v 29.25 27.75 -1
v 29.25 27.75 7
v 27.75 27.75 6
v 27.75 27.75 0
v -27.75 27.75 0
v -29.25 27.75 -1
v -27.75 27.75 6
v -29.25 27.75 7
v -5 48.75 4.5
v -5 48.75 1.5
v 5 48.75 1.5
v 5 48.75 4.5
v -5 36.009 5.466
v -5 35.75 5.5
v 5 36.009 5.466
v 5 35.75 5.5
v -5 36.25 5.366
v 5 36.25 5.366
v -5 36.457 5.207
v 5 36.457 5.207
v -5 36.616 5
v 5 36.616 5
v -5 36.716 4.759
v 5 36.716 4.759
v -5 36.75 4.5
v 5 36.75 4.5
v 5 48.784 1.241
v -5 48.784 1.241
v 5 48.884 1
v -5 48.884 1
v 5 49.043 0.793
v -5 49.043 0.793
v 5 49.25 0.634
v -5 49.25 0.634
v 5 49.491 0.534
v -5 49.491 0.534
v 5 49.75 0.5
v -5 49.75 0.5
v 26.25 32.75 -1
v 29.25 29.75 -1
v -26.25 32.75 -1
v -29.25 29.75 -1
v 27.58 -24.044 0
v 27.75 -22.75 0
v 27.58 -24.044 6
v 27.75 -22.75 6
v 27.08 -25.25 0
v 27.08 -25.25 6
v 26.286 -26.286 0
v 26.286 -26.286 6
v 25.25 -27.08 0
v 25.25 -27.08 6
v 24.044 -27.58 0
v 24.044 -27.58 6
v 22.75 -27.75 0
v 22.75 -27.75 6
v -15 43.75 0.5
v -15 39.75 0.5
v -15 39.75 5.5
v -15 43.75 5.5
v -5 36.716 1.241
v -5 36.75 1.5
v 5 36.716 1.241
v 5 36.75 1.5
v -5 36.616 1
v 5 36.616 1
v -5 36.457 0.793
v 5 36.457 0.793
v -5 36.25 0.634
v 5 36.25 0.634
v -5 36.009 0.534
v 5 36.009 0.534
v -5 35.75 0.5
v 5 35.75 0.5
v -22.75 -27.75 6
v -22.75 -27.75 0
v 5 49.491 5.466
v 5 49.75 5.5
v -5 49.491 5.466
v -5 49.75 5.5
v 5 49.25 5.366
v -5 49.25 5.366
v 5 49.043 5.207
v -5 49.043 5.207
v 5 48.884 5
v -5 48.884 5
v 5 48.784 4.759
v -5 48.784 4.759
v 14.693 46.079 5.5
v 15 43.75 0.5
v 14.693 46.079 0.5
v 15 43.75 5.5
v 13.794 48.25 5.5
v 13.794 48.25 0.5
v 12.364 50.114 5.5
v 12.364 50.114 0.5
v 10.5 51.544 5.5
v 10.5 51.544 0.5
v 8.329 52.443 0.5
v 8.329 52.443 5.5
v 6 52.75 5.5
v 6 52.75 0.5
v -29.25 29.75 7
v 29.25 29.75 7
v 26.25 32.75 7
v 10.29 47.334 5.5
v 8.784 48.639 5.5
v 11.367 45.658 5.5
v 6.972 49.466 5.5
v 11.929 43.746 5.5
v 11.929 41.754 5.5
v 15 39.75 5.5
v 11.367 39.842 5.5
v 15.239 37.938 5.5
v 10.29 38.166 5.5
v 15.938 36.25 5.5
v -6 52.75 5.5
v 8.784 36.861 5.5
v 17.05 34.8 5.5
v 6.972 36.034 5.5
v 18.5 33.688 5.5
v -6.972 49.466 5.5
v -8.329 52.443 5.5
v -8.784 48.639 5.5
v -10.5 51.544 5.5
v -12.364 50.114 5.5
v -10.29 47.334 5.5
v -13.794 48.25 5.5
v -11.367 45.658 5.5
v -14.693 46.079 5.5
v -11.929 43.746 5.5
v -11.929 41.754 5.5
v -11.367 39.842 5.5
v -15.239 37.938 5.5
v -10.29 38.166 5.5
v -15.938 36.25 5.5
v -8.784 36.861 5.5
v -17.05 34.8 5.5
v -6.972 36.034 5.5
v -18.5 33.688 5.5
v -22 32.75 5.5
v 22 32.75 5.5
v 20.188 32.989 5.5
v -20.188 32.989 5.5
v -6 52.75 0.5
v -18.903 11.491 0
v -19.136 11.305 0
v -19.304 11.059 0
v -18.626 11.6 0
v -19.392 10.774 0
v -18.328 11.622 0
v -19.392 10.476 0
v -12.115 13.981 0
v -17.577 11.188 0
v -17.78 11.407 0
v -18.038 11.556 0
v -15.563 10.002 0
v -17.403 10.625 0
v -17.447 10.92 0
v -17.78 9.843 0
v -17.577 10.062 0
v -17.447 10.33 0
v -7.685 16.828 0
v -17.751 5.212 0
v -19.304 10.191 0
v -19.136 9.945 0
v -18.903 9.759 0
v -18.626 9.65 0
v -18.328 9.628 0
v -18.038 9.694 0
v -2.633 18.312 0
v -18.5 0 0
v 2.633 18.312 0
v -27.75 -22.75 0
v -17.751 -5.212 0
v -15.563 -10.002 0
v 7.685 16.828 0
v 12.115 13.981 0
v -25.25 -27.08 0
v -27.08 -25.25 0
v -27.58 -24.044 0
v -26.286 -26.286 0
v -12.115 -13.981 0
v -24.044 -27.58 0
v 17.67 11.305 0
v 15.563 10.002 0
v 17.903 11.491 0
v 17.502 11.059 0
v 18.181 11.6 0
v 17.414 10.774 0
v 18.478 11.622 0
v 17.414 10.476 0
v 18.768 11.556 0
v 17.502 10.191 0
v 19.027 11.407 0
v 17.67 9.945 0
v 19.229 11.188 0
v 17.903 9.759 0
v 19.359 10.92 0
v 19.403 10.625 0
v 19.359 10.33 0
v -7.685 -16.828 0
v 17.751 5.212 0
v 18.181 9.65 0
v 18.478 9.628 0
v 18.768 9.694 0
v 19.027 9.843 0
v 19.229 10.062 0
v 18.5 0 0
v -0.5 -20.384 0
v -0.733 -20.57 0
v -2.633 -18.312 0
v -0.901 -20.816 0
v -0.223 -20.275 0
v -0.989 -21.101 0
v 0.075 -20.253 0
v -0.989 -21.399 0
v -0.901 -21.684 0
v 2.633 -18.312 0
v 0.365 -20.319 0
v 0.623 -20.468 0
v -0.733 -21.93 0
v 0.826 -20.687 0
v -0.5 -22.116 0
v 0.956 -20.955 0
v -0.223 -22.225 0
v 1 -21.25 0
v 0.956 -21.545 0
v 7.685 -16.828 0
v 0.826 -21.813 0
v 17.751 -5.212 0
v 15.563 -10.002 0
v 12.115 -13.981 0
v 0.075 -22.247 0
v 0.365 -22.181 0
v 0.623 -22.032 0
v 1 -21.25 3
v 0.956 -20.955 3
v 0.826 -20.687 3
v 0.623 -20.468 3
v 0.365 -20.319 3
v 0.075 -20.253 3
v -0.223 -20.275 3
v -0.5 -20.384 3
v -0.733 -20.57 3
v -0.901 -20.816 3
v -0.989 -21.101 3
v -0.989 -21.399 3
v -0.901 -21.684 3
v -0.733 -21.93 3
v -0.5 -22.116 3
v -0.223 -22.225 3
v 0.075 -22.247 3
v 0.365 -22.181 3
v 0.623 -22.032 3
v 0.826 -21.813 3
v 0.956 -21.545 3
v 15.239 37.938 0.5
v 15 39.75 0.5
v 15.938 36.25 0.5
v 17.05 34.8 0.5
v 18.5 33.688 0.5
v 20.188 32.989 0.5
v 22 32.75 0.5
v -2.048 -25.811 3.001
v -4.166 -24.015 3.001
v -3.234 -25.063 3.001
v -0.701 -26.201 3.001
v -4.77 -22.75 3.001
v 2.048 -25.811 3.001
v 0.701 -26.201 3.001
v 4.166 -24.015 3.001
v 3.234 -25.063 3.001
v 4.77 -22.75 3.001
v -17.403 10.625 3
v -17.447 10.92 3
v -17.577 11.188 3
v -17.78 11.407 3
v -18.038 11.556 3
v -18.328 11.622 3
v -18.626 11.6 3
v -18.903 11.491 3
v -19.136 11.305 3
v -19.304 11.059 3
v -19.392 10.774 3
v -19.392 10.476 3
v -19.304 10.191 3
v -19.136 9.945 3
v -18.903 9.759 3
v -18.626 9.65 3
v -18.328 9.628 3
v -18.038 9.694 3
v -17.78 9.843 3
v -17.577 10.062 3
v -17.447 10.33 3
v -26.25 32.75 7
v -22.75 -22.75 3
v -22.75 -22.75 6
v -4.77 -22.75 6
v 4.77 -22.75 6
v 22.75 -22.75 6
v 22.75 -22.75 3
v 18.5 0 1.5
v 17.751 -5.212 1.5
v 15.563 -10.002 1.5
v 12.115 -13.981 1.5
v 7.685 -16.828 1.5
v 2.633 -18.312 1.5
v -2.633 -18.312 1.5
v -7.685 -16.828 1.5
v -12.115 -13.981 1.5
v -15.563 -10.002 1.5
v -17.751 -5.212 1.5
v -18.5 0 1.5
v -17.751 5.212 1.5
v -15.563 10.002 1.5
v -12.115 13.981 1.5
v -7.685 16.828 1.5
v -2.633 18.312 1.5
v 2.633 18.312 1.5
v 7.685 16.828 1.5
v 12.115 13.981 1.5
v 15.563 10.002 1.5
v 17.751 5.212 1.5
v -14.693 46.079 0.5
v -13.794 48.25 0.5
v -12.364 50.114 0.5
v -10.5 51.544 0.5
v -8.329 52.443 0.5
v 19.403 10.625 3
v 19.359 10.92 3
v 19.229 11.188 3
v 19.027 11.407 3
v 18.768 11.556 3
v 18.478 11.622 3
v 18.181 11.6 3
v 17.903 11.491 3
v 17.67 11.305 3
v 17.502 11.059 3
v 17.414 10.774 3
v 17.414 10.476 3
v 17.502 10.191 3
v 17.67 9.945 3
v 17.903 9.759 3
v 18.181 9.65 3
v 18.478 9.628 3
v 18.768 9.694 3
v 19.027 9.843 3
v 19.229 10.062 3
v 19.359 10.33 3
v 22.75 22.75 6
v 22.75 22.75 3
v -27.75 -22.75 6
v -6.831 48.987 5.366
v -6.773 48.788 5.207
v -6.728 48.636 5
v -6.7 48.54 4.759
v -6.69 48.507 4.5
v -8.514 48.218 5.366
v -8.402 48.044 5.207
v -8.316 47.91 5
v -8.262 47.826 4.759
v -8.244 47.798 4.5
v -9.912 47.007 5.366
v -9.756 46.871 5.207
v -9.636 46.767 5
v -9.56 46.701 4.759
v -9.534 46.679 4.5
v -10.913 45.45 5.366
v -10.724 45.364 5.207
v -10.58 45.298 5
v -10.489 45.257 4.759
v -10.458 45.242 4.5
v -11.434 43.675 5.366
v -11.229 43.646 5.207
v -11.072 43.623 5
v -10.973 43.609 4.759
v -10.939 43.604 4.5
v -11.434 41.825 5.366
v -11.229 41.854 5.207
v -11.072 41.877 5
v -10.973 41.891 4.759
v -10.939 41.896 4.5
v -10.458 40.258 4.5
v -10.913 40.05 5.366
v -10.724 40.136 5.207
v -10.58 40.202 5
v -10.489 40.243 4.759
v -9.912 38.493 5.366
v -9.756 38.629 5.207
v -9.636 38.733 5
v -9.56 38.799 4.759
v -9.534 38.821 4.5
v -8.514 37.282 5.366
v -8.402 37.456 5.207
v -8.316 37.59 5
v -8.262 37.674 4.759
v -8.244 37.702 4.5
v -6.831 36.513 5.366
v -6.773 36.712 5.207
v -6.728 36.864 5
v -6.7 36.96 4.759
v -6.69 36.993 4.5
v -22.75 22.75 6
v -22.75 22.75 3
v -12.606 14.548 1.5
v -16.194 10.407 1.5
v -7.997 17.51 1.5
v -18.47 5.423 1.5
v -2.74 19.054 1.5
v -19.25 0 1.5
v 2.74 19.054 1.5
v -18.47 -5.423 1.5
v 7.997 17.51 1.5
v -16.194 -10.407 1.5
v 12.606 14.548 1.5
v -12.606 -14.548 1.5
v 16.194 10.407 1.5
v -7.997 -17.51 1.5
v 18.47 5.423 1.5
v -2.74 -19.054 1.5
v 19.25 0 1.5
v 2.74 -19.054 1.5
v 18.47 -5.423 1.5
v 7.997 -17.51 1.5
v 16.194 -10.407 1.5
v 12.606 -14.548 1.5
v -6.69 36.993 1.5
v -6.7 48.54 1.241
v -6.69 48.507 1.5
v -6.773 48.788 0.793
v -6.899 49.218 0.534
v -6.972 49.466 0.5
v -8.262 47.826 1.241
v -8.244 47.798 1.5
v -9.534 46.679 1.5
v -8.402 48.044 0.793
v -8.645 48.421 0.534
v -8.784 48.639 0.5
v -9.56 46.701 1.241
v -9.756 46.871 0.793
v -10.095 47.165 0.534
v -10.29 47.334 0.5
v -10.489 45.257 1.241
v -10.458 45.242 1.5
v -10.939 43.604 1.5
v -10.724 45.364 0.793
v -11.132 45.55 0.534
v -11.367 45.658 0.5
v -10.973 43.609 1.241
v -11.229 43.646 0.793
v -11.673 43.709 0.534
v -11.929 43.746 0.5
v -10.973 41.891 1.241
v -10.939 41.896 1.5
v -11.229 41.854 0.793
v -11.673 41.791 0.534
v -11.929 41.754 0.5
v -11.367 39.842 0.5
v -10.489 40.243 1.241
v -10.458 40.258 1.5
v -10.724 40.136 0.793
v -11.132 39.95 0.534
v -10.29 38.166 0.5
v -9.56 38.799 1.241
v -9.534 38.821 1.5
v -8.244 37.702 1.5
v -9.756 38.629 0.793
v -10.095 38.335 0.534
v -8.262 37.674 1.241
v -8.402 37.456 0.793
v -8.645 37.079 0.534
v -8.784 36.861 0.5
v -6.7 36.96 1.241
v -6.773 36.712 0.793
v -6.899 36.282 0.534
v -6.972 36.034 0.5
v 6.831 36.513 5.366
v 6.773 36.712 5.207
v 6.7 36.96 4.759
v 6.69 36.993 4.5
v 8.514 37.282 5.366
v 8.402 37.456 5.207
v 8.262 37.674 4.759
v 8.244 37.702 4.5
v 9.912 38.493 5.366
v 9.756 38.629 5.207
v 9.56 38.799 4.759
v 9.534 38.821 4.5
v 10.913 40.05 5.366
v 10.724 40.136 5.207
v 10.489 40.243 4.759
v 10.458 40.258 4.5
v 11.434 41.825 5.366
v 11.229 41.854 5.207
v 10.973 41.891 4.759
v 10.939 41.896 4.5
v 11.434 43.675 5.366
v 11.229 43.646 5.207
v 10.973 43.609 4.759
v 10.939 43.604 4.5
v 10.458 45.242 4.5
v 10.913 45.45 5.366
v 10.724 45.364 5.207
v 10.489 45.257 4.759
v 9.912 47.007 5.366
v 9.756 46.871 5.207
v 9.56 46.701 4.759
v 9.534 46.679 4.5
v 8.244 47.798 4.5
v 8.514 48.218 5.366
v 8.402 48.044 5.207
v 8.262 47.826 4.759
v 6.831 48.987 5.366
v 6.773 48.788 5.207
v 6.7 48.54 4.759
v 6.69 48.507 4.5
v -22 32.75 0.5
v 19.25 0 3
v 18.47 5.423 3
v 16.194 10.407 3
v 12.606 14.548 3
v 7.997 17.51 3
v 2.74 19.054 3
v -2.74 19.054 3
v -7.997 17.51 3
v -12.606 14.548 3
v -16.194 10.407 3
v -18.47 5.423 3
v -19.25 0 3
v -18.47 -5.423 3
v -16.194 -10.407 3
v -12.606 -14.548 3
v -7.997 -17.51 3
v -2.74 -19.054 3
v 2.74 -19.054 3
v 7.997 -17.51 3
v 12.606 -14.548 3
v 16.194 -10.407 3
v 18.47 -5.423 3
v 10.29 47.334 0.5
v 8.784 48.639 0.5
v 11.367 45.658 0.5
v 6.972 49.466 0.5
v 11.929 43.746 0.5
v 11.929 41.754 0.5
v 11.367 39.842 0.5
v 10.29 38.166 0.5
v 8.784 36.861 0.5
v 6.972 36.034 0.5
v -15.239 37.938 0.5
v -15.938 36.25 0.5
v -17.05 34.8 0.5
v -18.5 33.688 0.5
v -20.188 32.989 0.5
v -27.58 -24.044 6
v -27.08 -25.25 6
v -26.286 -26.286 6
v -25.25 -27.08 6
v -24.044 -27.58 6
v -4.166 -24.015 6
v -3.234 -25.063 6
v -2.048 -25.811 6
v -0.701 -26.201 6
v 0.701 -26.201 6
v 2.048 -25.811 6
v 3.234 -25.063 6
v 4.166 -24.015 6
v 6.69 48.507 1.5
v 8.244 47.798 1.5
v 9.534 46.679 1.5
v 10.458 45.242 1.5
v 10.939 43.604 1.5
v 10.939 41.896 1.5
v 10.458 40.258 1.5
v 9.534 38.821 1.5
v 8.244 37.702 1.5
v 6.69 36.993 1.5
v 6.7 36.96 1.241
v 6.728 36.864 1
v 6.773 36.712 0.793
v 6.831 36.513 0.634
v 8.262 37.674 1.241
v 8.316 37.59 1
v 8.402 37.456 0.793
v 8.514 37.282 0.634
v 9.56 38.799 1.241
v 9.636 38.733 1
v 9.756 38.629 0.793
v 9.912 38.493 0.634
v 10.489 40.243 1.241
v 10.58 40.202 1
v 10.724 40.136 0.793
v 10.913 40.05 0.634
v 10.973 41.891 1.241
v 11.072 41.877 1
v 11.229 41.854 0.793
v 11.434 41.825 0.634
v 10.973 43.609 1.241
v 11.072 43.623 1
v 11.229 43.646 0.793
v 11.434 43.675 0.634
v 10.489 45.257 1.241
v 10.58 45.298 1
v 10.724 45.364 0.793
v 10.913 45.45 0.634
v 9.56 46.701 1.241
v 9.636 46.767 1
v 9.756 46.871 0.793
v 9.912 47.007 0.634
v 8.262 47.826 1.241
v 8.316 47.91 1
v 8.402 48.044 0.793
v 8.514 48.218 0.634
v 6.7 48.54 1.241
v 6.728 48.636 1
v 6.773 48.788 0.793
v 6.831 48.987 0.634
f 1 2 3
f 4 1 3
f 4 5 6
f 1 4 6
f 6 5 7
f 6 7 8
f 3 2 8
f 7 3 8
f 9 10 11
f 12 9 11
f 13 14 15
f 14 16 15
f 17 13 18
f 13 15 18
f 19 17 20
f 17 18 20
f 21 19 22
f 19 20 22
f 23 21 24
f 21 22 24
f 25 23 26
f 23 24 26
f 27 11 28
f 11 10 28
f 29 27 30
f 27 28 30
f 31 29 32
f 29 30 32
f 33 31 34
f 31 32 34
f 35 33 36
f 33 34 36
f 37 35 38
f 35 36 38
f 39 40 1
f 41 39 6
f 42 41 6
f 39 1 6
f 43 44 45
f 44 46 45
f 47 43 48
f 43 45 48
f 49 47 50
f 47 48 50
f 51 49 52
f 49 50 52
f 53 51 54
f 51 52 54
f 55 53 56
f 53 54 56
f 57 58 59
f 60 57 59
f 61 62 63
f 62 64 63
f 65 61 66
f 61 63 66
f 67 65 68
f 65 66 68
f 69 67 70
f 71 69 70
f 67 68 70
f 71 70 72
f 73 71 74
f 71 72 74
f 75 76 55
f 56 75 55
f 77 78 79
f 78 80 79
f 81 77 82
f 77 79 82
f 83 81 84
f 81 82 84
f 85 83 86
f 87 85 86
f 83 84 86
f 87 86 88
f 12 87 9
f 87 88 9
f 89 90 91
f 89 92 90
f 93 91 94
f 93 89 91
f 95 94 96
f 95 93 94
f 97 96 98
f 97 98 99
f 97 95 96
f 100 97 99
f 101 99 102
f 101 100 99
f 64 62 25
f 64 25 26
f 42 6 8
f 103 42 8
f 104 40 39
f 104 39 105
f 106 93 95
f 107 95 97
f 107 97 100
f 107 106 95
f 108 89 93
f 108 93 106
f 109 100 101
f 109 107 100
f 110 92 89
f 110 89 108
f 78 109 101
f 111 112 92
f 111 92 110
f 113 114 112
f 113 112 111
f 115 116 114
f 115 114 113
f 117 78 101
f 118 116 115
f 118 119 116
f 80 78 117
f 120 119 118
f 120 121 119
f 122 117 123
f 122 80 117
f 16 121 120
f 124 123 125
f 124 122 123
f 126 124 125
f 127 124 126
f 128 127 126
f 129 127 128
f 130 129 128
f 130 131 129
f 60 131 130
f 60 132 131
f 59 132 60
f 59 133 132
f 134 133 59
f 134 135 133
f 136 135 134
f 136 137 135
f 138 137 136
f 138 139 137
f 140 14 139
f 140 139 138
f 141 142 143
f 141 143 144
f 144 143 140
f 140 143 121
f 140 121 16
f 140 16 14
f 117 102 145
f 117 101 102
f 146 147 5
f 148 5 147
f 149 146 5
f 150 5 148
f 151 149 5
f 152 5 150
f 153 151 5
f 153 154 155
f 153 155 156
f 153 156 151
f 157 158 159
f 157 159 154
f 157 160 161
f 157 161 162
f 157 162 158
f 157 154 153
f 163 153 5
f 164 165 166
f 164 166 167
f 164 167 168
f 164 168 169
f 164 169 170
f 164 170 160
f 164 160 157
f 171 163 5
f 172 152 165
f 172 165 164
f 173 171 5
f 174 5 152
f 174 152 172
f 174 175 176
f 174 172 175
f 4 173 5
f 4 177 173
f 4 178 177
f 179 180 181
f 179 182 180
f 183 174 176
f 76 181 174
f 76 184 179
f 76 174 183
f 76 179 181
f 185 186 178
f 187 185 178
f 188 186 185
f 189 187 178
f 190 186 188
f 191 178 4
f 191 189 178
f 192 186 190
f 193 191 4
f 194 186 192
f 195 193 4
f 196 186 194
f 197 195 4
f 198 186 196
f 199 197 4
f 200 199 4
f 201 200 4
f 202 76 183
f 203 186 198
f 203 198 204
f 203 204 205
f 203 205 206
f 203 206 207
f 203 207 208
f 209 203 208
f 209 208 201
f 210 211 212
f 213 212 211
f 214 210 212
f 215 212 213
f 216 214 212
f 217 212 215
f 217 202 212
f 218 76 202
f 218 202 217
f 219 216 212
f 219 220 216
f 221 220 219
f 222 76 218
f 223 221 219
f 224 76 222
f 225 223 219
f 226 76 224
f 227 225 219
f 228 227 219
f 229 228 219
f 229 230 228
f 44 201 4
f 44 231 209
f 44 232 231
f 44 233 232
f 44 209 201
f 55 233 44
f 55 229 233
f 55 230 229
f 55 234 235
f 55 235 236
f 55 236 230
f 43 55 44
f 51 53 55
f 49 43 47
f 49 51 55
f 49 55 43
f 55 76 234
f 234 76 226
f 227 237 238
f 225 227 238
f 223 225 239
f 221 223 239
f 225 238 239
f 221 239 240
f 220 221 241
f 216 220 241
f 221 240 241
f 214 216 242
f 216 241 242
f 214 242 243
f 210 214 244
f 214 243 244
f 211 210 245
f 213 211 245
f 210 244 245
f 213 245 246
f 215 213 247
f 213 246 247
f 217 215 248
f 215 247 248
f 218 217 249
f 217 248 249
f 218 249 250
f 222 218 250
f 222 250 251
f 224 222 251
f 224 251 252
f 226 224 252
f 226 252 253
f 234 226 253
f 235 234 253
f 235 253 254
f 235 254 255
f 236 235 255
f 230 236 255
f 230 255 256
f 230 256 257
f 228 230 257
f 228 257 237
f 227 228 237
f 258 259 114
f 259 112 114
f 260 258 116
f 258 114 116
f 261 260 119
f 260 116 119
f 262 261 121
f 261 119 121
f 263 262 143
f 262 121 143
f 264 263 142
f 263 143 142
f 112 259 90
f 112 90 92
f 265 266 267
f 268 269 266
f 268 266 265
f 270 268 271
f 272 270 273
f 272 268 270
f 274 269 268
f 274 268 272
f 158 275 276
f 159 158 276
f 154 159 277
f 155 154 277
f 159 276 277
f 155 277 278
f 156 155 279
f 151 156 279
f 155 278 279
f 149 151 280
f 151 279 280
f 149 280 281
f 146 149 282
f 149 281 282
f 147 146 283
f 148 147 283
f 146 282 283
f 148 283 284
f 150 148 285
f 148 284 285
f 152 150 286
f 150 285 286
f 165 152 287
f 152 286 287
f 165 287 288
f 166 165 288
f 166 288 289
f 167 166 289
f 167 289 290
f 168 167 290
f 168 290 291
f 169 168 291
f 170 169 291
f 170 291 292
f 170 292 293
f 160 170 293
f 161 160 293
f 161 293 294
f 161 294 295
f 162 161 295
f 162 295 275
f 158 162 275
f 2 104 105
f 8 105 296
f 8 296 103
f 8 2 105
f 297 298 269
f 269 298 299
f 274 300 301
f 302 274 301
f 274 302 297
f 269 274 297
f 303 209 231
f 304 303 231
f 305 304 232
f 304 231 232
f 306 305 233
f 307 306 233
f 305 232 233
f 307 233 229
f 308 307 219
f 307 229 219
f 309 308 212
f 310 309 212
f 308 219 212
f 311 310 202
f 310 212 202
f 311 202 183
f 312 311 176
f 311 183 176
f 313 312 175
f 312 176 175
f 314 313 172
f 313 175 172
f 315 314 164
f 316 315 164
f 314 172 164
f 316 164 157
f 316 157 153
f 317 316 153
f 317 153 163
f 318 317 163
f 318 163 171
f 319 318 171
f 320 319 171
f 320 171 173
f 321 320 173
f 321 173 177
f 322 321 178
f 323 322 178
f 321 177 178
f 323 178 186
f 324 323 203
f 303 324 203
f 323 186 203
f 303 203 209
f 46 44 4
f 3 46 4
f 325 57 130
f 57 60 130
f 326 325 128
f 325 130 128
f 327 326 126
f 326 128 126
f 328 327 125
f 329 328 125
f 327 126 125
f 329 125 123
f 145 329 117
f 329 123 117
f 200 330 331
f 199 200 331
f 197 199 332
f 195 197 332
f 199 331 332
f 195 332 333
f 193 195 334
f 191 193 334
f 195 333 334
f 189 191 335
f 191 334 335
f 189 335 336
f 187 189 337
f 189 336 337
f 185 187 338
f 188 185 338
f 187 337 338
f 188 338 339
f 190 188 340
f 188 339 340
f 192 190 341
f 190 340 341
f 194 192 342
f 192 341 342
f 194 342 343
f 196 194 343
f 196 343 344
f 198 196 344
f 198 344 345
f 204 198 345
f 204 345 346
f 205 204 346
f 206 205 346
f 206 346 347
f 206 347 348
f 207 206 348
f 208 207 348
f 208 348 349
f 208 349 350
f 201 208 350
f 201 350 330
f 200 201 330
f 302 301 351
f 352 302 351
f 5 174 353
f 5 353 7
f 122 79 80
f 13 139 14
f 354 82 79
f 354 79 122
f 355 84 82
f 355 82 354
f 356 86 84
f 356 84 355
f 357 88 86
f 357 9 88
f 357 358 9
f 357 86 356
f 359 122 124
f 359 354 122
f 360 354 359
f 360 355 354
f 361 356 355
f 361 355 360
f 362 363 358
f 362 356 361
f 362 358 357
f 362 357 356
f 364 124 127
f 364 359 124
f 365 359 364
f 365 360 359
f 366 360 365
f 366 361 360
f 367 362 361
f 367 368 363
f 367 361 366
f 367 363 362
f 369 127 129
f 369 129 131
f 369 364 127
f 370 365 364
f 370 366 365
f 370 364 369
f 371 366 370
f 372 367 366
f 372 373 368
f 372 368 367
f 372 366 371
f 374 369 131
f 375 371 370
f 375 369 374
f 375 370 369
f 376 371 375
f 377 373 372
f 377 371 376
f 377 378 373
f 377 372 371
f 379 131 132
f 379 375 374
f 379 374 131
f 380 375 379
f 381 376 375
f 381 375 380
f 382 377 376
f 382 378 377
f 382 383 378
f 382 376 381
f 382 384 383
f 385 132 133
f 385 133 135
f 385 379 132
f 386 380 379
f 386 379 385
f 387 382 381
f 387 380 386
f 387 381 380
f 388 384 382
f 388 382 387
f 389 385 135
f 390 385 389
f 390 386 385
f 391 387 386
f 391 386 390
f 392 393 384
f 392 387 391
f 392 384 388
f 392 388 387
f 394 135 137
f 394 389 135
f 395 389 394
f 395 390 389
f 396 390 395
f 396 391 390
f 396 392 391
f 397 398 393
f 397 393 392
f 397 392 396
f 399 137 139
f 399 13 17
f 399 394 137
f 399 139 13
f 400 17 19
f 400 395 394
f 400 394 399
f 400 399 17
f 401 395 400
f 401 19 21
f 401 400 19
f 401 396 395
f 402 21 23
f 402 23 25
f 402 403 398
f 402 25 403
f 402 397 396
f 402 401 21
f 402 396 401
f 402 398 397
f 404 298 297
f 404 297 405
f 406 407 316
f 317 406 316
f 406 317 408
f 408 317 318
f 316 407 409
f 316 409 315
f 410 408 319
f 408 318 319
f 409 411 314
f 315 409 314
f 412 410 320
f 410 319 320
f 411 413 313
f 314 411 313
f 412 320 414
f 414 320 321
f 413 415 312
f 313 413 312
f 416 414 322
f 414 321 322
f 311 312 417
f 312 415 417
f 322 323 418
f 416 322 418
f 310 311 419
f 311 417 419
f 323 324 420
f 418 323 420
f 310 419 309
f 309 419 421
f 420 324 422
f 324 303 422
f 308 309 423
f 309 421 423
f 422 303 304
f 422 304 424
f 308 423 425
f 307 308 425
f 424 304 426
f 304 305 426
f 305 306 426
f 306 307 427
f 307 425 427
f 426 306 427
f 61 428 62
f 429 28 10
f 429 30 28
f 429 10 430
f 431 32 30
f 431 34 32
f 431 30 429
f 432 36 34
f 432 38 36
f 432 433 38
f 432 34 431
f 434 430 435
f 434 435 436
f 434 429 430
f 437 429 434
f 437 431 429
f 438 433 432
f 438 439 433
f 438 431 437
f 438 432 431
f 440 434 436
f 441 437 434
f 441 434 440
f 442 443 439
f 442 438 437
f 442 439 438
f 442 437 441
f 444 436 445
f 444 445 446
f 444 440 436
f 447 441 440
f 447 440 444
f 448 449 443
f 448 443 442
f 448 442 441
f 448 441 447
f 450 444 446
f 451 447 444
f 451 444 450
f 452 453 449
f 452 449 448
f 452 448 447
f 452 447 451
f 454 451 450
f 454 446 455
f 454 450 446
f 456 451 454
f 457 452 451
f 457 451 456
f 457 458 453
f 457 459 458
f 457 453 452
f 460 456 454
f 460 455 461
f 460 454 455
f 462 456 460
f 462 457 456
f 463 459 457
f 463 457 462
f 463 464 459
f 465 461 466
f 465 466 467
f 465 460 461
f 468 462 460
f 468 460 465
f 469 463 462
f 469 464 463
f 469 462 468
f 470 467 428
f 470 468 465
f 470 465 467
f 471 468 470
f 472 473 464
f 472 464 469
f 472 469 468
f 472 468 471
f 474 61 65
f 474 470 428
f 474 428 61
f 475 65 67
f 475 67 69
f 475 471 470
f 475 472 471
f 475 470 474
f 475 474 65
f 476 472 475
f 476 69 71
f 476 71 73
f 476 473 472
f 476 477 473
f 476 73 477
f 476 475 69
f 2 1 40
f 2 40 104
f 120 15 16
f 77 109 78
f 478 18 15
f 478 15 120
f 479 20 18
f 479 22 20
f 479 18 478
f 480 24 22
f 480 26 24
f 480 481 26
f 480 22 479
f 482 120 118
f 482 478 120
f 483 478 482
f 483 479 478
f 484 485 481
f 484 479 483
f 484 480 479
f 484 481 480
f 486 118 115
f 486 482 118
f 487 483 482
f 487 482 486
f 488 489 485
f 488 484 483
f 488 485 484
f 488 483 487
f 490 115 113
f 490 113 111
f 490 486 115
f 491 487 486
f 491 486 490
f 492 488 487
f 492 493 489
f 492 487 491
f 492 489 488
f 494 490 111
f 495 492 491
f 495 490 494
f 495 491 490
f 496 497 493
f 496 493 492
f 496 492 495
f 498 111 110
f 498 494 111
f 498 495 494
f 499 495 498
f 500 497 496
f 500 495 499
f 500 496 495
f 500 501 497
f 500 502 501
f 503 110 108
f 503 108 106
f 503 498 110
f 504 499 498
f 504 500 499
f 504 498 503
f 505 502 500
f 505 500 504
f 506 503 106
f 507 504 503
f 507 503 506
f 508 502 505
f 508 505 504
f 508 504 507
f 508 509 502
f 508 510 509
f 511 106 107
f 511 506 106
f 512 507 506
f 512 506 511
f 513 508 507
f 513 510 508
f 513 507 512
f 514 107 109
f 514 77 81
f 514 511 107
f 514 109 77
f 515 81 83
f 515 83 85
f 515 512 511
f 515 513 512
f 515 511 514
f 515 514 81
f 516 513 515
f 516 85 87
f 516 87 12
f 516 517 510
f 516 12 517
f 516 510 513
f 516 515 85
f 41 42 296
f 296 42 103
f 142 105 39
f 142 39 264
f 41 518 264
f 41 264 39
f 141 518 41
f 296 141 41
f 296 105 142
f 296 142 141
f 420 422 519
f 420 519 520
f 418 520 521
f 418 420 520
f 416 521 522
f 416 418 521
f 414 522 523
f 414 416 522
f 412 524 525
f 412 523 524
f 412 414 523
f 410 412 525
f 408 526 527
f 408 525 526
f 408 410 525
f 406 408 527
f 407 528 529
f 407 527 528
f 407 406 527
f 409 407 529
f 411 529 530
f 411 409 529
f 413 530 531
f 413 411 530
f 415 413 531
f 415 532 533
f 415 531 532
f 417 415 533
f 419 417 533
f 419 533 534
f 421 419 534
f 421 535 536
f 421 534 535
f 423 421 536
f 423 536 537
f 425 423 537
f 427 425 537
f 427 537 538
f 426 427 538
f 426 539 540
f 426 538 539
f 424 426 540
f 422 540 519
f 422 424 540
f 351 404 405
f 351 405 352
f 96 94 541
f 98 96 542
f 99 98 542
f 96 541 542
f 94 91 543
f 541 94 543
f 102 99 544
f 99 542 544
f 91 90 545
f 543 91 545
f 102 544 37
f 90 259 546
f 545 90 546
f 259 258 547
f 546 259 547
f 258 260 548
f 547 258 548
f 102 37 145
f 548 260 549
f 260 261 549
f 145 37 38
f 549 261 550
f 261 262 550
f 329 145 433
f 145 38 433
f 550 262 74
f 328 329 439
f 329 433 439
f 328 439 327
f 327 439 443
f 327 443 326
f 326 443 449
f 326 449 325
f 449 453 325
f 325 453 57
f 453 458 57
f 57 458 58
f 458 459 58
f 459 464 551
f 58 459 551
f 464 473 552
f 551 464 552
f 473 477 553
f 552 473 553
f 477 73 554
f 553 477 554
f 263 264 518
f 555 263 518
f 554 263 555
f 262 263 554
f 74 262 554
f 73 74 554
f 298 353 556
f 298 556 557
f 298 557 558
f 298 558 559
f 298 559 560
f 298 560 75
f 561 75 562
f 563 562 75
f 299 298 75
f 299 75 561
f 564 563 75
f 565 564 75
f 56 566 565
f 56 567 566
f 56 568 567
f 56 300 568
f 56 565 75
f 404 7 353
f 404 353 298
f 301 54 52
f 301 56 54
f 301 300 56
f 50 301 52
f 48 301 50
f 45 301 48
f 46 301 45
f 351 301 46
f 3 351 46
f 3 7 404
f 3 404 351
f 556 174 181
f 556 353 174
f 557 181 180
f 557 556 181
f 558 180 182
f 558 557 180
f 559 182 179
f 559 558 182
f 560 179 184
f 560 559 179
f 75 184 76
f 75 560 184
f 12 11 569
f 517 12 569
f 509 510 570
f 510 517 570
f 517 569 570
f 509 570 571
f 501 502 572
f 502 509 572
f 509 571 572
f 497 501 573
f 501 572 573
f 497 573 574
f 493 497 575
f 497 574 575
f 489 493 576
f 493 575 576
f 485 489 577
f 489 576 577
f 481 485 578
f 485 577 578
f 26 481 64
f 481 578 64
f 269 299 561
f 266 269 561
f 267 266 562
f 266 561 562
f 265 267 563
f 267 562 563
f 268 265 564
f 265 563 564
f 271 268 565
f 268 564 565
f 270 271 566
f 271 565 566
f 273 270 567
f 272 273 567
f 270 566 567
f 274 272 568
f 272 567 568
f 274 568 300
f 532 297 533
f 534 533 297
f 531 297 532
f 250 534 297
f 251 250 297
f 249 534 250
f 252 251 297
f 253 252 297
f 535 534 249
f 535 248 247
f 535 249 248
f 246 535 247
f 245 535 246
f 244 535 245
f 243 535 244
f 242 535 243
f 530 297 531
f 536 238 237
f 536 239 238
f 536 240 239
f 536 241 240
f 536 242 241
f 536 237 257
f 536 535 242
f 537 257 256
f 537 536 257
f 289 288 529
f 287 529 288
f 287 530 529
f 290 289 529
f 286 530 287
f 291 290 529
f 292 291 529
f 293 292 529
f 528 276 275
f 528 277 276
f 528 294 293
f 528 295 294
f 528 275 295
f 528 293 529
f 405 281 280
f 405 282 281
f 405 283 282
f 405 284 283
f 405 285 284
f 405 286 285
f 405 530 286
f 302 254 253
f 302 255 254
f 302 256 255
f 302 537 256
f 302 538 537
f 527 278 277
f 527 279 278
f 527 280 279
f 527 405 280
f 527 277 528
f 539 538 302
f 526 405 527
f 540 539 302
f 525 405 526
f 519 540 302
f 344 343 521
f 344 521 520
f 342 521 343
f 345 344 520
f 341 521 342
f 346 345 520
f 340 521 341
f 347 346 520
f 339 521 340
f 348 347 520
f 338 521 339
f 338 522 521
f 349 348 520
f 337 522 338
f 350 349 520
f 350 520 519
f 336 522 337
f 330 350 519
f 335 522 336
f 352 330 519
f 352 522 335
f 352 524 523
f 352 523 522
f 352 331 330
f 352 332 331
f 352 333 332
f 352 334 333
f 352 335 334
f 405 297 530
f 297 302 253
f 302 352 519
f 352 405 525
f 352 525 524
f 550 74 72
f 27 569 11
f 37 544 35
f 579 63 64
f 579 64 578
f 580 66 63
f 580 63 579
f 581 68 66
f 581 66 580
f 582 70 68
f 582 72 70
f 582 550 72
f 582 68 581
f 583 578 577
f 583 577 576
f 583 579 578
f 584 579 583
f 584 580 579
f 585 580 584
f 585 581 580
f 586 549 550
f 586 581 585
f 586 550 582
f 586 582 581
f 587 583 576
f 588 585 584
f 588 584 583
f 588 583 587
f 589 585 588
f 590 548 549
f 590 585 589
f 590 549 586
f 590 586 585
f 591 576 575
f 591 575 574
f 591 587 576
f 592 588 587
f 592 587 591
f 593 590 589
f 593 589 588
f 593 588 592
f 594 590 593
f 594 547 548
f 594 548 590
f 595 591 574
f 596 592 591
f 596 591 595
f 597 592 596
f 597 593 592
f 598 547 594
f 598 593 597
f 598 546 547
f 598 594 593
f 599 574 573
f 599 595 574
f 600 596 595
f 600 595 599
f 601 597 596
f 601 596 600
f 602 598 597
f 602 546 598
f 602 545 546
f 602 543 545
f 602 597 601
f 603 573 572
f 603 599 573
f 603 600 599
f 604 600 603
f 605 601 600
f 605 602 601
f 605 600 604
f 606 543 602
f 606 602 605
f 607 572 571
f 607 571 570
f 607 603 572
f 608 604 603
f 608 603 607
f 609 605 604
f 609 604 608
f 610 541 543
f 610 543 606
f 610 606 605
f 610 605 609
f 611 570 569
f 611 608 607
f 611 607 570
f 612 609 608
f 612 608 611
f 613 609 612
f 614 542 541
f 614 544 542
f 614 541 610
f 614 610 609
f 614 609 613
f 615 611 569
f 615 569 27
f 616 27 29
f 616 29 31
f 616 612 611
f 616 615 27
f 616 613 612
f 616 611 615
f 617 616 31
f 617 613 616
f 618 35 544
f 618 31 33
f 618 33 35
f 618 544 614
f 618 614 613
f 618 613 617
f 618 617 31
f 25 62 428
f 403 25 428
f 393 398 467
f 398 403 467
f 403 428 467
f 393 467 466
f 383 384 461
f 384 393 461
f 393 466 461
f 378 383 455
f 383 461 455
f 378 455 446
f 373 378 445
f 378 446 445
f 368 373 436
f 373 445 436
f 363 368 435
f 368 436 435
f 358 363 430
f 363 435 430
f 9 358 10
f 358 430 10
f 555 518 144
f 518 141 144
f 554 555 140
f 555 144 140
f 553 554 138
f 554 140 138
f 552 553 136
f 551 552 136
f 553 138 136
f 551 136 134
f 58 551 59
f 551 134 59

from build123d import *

# Parameters (mm, degrees)
SKETCH_W        = 55.5
SKETCH_H        = 55.5
SKETCH_R        = 19.25
PAD_DEPTH       = 6
SKETCH001_W     = 58.5
SKETCH001_H     = 8
PAD001_DEPTH    = 5
SKETCH002_W     = 30
SKETCH002_H     = 5
PAD002_DEPTH    = 20
FILLET_R        = 5
POCKET_DEPTH    = 6
FILLET001_R     = 9
FILLET002_R     = 7
CHAMFER_SIZE    = 3
SKETCH004_R     = 19.25
SKETCH004_R_2   = 18.5
PAD003_DEPTH    = 1.5
SKETCH005_W     = 45.5
SKETCH005_H     = 45.5
POCKET001_DEPTH = 3
SKETCH006_R     = 1
POCKET002_DEPTH = 6
FILLET003_R     = 1
FILLET004_R     = 1
SKETCH007_R     = 5
POCKET003_DEPTH = 2.999


with BuildPart() as part:
    # Sketch → Pad (new body)
    with BuildSketch(Plane.XY):
        Rectangle(SKETCH_W, SKETCH_H)
        Circle(SKETCH_R, mode=Mode.SUBTRACT)
    extrude(amount=PAD_DEPTH)

    # Sketch001 → Pad001 (new body)
    with BuildSketch(Plane(origin=(0, 27.75, 0), x_dir=(-1, 0, 0), z_dir=(0, 1, 0))):
        with Locations((0, 3)):
            Rectangle(SKETCH001_W, SKETCH001_H)
    extrude(amount=PAD001_DEPTH)

    # Sketch002 → Pad002 (new body)
    with BuildSketch(Plane(origin=(0, 32.75, 0), x_dir=(-1, 0, 0), z_dir=(0, 1, 0))):
        with Locations((0, 3)):
            Rectangle(SKETCH002_W, SKETCH002_H)
    extrude(amount=PAD002_DEPTH)

    # Fillet
    fillet_edges = [part.edges().sort_by_distance(p)[0] for p in [
        (-27.75, -27.75, 3),
        (27.75, -27.75, 3),
    ]]
    fillet(fillet_edges, radius=FILLET_R)

    # Sketch003 → Pocket (cut)
    with BuildSketch(Plane(origin=(0, 0, 0.5), x_dir=(1, 0, 0), z_dir=(0, 0, -1))):
        with BuildLine():
            ThreePointArc((-5, -36.75), (-11, -42.75), (-5, -48.75))
            Line((-5, -48.75), (5, -48.75))
            ThreePointArc((5, -48.75), (11, -42.75), (5, -36.75))
            Line((-5, -36.75), (5, -36.75))
        make_face()
    extrude(amount=-POCKET_DEPTH, mode=Mode.SUBTRACT)

    # Fillet001
    fillet001_edges = [part.edges().sort_by_distance(p)[0] for p in [
        (15, 52.75, 3),
        (-15, 52.75, 3),
    ]]
    fillet(fillet001_edges, radius=FILLET001_R)

    # Fillet002
    fillet002_edges = [part.edges().sort_by_distance(p)[0] for p in [
        (15, 32.75, 3),
        (-15, 32.75, 3),
    ]]
    fillet(fillet002_edges, radius=FILLET002_R)

    # Chamfer
    chamfer_edges = [part.edges().sort_by_distance(p)[0] for p in [
        (-29.25, 32.75, 3),
        (29.25, 32.75, 3),
    ]]
    chamfer(chamfer_edges, length=CHAMFER_SIZE)

    # Sketch004 → Pad003 (new body)
    with BuildSketch(Plane(origin=(0, 0, 0), x_dir=(1, 0, 0), z_dir=(0, 0, -1))):
        Circle(SKETCH004_R)
        Circle(SKETCH004_R_2, mode=Mode.SUBTRACT)
    extrude(amount=-PAD003_DEPTH)

    # Sketch005 → Pocket001 (cut)
    with BuildSketch(Plane.XY.offset(6)):
        Rectangle(SKETCH005_W, SKETCH005_H)
    extrude(amount=-POCKET001_DEPTH, mode=Mode.SUBTRACT)

    # Sketch006 → Pocket002 (cut)
    with BuildSketch(Plane.XY.offset(3)):
        with Locations((-18.40304, 10.625)):
            Circle(SKETCH006_R)
        with Locations((18.40304, 10.625)):
            Circle(SKETCH006_R)
        with Locations((0, -21.25)):
            Circle(SKETCH006_R)
    extrude(amount=-POCKET002_DEPTH, mode=Mode.SUBTRACT)

    # Fillet003
    fillet003_edges = [part.edges().sort_by_distance(p)[0] for p in [
        (0, 48.75, 5.5),
    ]]
    fillet(fillet003_edges, radius=FILLET003_R)

    # Fillet004
    fillet004_edges = [part.edges().sort_by_distance(p)[0] for p in [
        (0, 36.75, 0.5),
    ]]
    fillet(fillet004_edges, radius=FILLET004_R)

    # Sketch007 → Pocket003 (cut)
    with BuildSketch(Plane.XY.offset(6)):
        with Locations((0, -21.25)):
            Circle(SKETCH007_R)
    extrude(amount=-POCKET003_DEPTH, mode=Mode.SUBTRACT)


solid = part.part
